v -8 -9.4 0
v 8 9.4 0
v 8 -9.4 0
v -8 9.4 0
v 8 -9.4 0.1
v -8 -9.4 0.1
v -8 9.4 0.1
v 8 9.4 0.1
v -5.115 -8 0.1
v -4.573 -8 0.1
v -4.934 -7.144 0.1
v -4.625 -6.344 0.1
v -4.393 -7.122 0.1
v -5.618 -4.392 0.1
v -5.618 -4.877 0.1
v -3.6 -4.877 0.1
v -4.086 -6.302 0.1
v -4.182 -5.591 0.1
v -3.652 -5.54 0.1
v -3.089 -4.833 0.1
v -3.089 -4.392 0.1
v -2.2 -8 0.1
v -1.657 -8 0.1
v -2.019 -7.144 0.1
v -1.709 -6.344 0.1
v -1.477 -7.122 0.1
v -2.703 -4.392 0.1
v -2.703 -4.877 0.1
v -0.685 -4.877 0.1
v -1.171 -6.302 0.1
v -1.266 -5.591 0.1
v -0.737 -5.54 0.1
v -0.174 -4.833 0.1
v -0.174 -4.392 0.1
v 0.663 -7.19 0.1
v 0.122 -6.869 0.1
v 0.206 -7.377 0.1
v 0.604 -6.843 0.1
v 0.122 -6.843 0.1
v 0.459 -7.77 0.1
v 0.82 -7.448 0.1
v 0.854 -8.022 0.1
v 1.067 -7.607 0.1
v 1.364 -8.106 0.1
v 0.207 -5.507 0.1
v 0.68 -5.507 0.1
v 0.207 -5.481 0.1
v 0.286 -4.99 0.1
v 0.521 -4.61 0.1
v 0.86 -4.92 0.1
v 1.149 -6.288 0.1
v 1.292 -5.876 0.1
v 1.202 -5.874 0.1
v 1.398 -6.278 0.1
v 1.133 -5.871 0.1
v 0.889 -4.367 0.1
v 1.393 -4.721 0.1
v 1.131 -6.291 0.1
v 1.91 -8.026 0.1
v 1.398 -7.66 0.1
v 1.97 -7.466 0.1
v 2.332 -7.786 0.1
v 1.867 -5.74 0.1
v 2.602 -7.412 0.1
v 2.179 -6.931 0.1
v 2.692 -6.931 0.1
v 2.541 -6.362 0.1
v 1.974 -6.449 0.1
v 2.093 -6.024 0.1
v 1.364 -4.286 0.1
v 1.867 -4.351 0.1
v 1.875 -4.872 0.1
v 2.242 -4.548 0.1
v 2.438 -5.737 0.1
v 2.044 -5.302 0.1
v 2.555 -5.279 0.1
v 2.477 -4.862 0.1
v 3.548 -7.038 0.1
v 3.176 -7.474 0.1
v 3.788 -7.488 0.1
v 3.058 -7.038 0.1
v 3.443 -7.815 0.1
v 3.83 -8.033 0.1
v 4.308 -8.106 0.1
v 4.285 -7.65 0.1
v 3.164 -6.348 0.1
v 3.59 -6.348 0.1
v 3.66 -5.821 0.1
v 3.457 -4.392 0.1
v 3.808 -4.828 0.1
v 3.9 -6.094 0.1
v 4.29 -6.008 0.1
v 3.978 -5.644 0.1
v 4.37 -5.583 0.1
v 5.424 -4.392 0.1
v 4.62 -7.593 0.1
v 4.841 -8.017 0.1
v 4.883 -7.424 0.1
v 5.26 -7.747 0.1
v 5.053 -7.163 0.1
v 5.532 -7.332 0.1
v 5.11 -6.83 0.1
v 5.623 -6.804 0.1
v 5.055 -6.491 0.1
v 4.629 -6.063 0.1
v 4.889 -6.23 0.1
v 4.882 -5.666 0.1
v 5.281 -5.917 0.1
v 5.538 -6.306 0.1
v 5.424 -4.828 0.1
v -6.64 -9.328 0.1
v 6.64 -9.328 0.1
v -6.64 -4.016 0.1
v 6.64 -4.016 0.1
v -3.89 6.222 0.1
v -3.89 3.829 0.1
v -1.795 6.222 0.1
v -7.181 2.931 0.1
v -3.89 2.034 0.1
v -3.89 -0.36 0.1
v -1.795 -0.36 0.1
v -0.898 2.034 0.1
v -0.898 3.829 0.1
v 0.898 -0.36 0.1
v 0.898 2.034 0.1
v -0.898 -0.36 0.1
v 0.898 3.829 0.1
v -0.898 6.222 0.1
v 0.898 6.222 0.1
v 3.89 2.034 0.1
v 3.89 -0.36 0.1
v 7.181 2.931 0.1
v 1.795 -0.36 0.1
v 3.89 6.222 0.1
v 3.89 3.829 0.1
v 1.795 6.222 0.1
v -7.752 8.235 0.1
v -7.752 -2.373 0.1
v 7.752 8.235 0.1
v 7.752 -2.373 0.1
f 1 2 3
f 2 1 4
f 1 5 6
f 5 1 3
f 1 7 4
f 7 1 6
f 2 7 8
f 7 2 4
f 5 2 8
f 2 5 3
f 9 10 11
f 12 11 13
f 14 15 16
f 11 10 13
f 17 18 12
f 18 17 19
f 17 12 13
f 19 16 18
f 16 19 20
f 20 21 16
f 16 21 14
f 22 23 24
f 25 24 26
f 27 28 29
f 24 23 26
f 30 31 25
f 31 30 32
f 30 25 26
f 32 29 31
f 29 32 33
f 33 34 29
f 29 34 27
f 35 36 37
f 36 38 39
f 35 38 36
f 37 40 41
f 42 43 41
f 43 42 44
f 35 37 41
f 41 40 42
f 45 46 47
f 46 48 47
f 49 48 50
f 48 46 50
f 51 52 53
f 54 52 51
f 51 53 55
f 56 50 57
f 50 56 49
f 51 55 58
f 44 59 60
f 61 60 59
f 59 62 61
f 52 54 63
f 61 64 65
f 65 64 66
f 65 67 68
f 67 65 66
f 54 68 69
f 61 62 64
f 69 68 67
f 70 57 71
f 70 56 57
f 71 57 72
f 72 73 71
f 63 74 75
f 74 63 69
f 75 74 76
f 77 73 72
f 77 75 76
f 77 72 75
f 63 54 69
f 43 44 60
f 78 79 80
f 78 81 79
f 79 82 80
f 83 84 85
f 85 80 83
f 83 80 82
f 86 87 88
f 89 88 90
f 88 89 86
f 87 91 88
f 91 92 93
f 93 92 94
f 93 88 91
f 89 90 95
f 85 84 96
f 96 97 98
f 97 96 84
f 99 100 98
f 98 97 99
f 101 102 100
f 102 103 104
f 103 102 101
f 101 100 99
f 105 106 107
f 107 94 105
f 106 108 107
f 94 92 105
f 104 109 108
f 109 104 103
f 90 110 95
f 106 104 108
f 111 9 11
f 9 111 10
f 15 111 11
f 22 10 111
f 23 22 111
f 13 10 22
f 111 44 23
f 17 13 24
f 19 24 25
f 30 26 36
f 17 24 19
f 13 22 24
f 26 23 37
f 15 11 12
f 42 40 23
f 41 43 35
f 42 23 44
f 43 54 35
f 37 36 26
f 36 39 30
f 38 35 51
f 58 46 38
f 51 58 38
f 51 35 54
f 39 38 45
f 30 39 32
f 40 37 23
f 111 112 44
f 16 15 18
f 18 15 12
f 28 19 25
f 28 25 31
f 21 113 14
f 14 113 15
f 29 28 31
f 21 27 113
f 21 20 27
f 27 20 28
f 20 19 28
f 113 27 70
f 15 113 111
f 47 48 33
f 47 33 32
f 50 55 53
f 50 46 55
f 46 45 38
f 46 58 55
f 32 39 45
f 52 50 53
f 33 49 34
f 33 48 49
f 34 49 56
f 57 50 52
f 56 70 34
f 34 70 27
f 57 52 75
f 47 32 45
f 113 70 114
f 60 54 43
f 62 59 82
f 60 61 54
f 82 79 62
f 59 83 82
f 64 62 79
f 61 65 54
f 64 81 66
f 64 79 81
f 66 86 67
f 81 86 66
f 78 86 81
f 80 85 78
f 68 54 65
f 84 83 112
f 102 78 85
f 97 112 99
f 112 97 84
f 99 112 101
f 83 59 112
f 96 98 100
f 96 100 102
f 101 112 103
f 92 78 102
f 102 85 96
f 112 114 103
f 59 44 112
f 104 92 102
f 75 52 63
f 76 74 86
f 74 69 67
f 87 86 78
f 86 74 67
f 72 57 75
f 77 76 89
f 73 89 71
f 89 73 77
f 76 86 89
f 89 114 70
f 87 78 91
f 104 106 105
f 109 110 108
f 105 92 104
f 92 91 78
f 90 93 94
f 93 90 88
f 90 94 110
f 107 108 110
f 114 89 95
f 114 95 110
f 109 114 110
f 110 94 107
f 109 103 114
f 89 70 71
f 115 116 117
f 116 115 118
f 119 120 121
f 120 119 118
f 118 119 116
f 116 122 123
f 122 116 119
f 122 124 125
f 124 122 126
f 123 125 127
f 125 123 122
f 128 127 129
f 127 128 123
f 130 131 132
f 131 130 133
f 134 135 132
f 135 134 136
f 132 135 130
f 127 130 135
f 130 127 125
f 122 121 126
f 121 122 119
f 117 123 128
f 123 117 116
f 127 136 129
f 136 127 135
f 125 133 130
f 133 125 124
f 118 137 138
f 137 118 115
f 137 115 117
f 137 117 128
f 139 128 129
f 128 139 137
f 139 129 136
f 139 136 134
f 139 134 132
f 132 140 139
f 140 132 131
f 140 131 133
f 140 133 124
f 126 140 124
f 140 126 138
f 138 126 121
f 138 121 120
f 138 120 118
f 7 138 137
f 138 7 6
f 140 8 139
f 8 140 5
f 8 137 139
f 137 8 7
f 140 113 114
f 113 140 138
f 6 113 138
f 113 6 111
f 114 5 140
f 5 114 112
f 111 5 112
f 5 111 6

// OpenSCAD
// file: s/191915schb.scad
use <../../lib.scad>
function ldraw_lib__s__191915schb() = [
// 0 ~Swiss Railways Logo Background
// 0 Name: s\191915schb.dat
// 0 Author: Chris Dee [cwdee]
// 0 !LDRAW_ORG Subpart UPDATE 2012-01
// 0 !LICENSE Licensed under CC BY 2.0 and CC BY 4.0 : see CAreadme.txt
// 
// 0 BFC CERTIFY CCW
  [0,"BFC","CERTIFY"],
  [0,"BFC","CCW"],
// 
// 0 !HISTORY 2012-03-30 [PTadmin] Official Update 2012-01
// 
// 
// 4 16 -13.2 0 -24.2 -6.6 0 -24.2 -6.6 0 -6.6 -28.6 0 -6.6
  [4,16,-13.2,0,-24.2,-6.6,0,-24.2,-6.6,0,-6.6,-28.6,0,-6.6],
// 4 16 -6.6 0 6.6 -6.6 0 24.2 -13.2 0 24.2 -28.6 0 6.6
  [4,16,-6.6,0,6.6,-6.6,0,24.2,-13.2,0,24.2,-28.6,0,6.6],
// 4 16 13.2 0 24.2 6.6 0 24.2 6.6 0 6.6 28.6 0 6.6
  [4,16,13.2,0,24.2,6.6,0,24.2,6.6,0,6.6,28.6,0,6.6],
// 4 16 6.6 0 -6.6 6.6 0 -24.2 13.2 0 -24.2 28.6 0 -6.6
  [4,16,6.6,0,-6.6,6.6,0,-24.2,13.2,0,-24.2,28.6,0,-6.6],
// 
// 3 16 -52.8 0 0 -57 0 39 -57 0 -39
  [3,16,-52.8,0,0,-57,0,39,-57,0,-39],
// 3 16 -57 0 39 -52.8 0 0 -28.6 0 24.2
  [3,16,-57,0,39,-52.8,0,0,-28.6,0,24.2],
// 3 16 -57 0 39 -28.6 0 24.2 -13.2 0 24.2
  [3,16,-57,0,39,-28.6,0,24.2,-13.2,0,24.2],
// 3 16 -57 0 39 -13.2 0 24.2 -6.6 0 24.2
  [3,16,-57,0,39,-13.2,0,24.2,-6.6,0,24.2],
// 4 16 -57 0 39 -6.6 0 24.2 6.6 0 24.2 57 0 39
  [4,16,-57,0,39,-6.6,0,24.2,6.6,0,24.2,57,0,39],
// 3 16 57 0 39 6.6 0 24.2 13.2 0 24.2
  [3,16,57,0,39,6.6,0,24.2,13.2,0,24.2],
// 3 16 57 0 39 13.2 0 24.2 28.6 0 24.2
  [3,16,57,0,39,13.2,0,24.2,28.6,0,24.2],
// 3 16 57 0 39 28.6 0 24.2 52.8 0 0
  [3,16,57,0,39,28.6,0,24.2,52.8,0,0],
// 
// 3 16 52.8 0 0 57 0 -39 57 0 39
  [3,16,52.8,0,0,57,0,-39,57,0,39],
// 3 16 57 0 -39 52.8 0 0 28.6 0 -24.2
  [3,16,57,0,-39,52.8,0,0,28.6,0,-24.2],
// 3 16 57 0 -39 28.6 0 -24.2 13.2 0 -24.2
  [3,16,57,0,-39,28.6,0,-24.2,13.2,0,-24.2],
// 3 16 57 0 -39 13.2 0 -24.2 6.6 0 -24.2
  [3,16,57,0,-39,13.2,0,-24.2,6.6,0,-24.2],
// 4 16 57 0 -39 6.6 0 -24.2 -6.6 0 -24.2 -57 0 -39
  [4,16,57,0,-39,6.6,0,-24.2,-6.6,0,-24.2,-57,0,-39],
// 3 16 -57 0 -39 -6.6 0 -24.2 -13.2 0 -24.2
  [3,16,-57,0,-39,-6.6,0,-24.2,-13.2,0,-24.2],
// 3 16 -57 0 -39 -13.2 0 -24.2 -28.6 0 -24.2
  [3,16,-57,0,-39,-13.2,0,-24.2,-28.6,0,-24.2],
// 3 16 -57 0 -39 -28.6 0 -24.2 -52.8 0 0
  [3,16,-57,0,-39,-28.6,0,-24.2,-52.8,0,0],
// 0
];
module ldraw_lib__s__191915schb(step=0, col=false, unit=2/5, alt=false, line=0.2, solid=!$preview)
    makepoly(ldraw_lib__s__191915schb(), step=step, col=col, unit=unit, alt=alt, line=line, solid=solid);
ldraw_lib__s__191915schb(line=0.2);
// file: s/191915scha.scad
use <../../lib.scad>
function ldraw_lib__s__191915scha() = [
// 0 ~Swiss Railways Logo Foreground
// 0 Name: s\191915scha.dat
// 0 Author: Chris Dee [cwdee]
// 0 !LDRAW_ORG Subpart UPDATE 2012-01
// 0 !LICENSE Licensed under CC BY 2.0 and CC BY 4.0 : see CAreadme.txt
// 
// 0 BFC CERTIFY CCW
  [0,"BFC","CERTIFY"],
  [0,"BFC","CCW"],
// 
// 0 !HISTORY 2012-03-30 [PTadmin] Official Update 2012-01
// 
// 
// 4 16 -13.2 0 24.2 -28.6 0 24.2 -52.8 0 0 -28.6 0 6.6
  [4,16,-13.2,0,24.2,-28.6,0,24.2,-52.8,0,0,-28.6,0,6.6],
// 4 16 -52.8 0 0 -28.6 0 -24.2 -13.2 0 -24.2 -28.6 0 -6.6
  [4,16,-52.8,0,0,-28.6,0,-24.2,-13.2,0,-24.2,-28.6,0,-6.6],
// 3 16 -52.8 0 0 -28.6 0 -6.6 -28.6 0 6.6
  [3,16,-52.8,0,0,-28.6,0,-6.6,-28.6,0,6.6],
// 4 16 -28.6 0 6.6 -28.6 0 -6.6 -6.6 0 -6.6 -6.6 0 6.6
  [4,16,-28.6,0,6.6,-28.6,0,-6.6,-6.6,0,-6.6,-6.6,0,6.6],
// 
// 4 16 6.6 0 -6.6 -6.6 0 -6.6 -6.6 0 -24.2 6.6 0 -24.2
  [4,16,6.6,0,-6.6,-6.6,0,-6.6,-6.6,0,-24.2,6.6,0,-24.2],
// 4 16 6.6 0 6.6 -6.6 0 6.6 -6.6 0 -6.6 6.6 0 -6.6
  [4,16,6.6,0,6.6,-6.6,0,6.6,-6.6,0,-6.6,6.6,0,-6.6],
// 4 16 6.6 0 24.2 -6.6 0 24.2 -6.6 0 6.6 6.6 0 6.6
  [4,16,6.6,0,24.2,-6.6,0,24.2,-6.6,0,6.6,6.6,0,6.6],
// 
// 4 16 13.2 0 -24.2 28.6 0 -24.2 52.8 0 0 28.6 0 -6.6
  [4,16,13.2,0,-24.2,28.6,0,-24.2,52.8,0,0,28.6,0,-6.6],
// 4 16 52.8 0 0 28.6 0 24.2 13.2 0 24.2 28.6 0 6.6
  [4,16,52.8,0,0,28.6,0,24.2,13.2,0,24.2,28.6,0,6.6],
// 3 16 52.8 0 0 28.6 0 6.6 28.6 0 -6.6
  [3,16,52.8,0,0,28.6,0,6.6,28.6,0,-6.6],
// 4 16 28.6 0 -6.6 28.6 0 6.6 6.6 0 6.6 6.6 0 -6.6
  [4,16,28.6,0,-6.6,28.6,0,6.6,6.6,0,6.6,6.6,0,-6.6],
// 0
];
module ldraw_lib__s__191915scha(step=0, col=false, unit=2/5, alt=false, line=0.2, solid=!$preview)
    makepoly(ldraw_lib__s__191915scha(), step=step, col=col, unit=unit, alt=alt, line=line, solid=solid);
ldraw_lib__s__191915scha(line=0.2);
// file: s/196945sch.scad
use <../../lib.scad>
use <191915scha.scad>
use <191915schb.scad>
function ldraw_lib__s__196945sch() = [
// 0 ~Swiss Railways Logo Black
// 0 Name: s\196945sch.dat
// 0 Author: Chris Dee [cwdee]
// 0 !LDRAW_ORG Subpart UPDATE 2012-01
// 0 !LICENSE Licensed under CC BY 2.0 and CC BY 4.0 : see CAreadme.txt
// 
// 0 BFC CERTIFY CCW
  [0,"BFC","CERTIFY"],
  [0,"BFC","CCW"],
// 
// 0 !HISTORY 2012-03-30 [PTadmin] Official Update 2012-01
// 
// 
// 1 0 0 0 0 1 0 0 0 1 0 0 0 1 s\191915scha.dat
  [1,0,0,0,0,1,0,0,0,1,0,0,0,1, ldraw_lib__s__191915scha()],
// 1 16 0 0 0 1 0 0 0 1 0 0 0 1 s\191915schb.dat
  [1,16,0,0,0,1,0,0,0,1,0,0,0,1, ldraw_lib__s__191915schb()],
// 0
];
module ldraw_lib__s__196945sch(step=0, col=false, unit=2/5, alt=false, line=0.2, solid=!$preview)
    makepoly(ldraw_lib__s__196945sch(), step=step, col=col, unit=unit, alt=alt, line=line, solid=solid);
ldraw_lib__s__196945sch(line=0.2);
// file: ../p/box5-12.scad
use <../lib.scad>
function ldraw_lib__box5_12() = [
// 0 Box with 5 Faces without Any Edges
// 0 Name: box5-12.dat
// 0 Author: Chris Dee [cwdee]
// 0 !LDRAW_ORG Primitive UPDATE 2009-02
// 0 !LICENSE Licensed under CC BY 2.0 and CC BY 4.0 : see CAreadme.txt
// 
// 0 BFC CERTIFY CCW
  [0,"BFC","CERTIFY"],
  [0,"BFC","CCW"],
// 
// 0 !HISTORY 2009-09-03 [PTadmin] Official Update 2009-02
// 
// 
// 4 16 1 1 1 1 1 -1 -1 1 -1 -1 1 1
  [4,16,1,1,1,1,1,-1,-1,1,-1,-1,1,1],
// 4 16 -1 0 1 1 0 1 1 1 1 -1 1 1
  [4,16,-1,0,1,1,0,1,1,1,1,-1,1,1],
// 4 16 -1 0 -1 -1 0 1 -1 1 1 -1 1 -1
  [4,16,-1,0,-1,-1,0,1,-1,1,1,-1,1,-1],
// 4 16 1 0 -1 -1 0 -1 -1 1 -1 1 1 -1
  [4,16,1,0,-1,-1,0,-1,-1,1,-1,1,1,-1],
// 4 16 1 0 1 1 0 -1 1 1 -1 1 1 1
  [4,16,1,0,1,1,0,-1,1,1,-1,1,1,1],
// 0
];
module ldraw_lib__box5_12(step=0, col=false, unit=2/5, alt=false, line=0.2, solid=!$preview)
    makepoly(ldraw_lib__box5_12(), step=step, col=col, unit=unit, alt=alt, line=line, solid=solid);
ldraw_lib__box5_12(line=0.2);
// main file
use <../lib.scad>
use <../p/box5-12.scad>
use <s/196945s02.scad>
use <s/196945sch.scad>
function ldraw_lib__196945p() = [
// 0 Sticker  2.4 x  2 with Black Swiss Railways Logo and "7735"
// 0 Name: 196945p.dat
// 0 Author: Chris Dee [cwdee]
// 0 !LDRAW_ORG Part UPDATE 2012-01
// 0 !LICENSE Licensed under CC BY 2.0 and CC BY 4.0 : see CAreadme.txt
// 
// 0 BFC CERTIFY CCW
  [0,"BFC","CERTIFY"],
  [0,"BFC","CCW"],
// 
// 0 !HISTORY 2012-03-30 [PTadmin] Official Update 2012-01
// 
// 
// 1 16 0 -0.25 0 20 0 0 0 0.25 0 0 0 -23.5 box5-12.dat
  [1,16,0,-0.25,0,20,0,0,0,0.25,0,0,0,-23.5, ldraw_lib__box5_12()],
// 1 16 0 -0.25 -20 0.415 0 0 0 1 0 0 0 0.415 s\196945s02.dat
  [1,16,0,-0.25,-20,0.415,0,0,0,1,0,0,0,0.415, ldraw_lib__s__196945s02()],
// 1 16 0 -0.25 7.328 0.34 0 0 0 1 0 0 0 0.34 s\196945sch.dat
  [1,16,0,-0.25,7.328,0.34,0,0,0,1,0,0,0,0.34, ldraw_lib__s__196945sch()],
// 4 16 -20 -0.25 -23.5 -19.38 -0.25 -5.932 -19.38 -0.25 20.588 -20 -0.25 23.5
  [4,16,-20,-0.25,-23.5,-19.38,-0.25,-5.932,-19.38,-0.25,20.588,-20,-0.25,23.5],
// 4 16 20 -0.25 23.5 19.38 -0.25 20.588 19.38 -0.25 -5.932 20 -0.25 -23.5
  [4,16,20,-0.25,23.5,19.38,-0.25,20.588,19.38,-0.25,-5.932,20,-0.25,-23.5],
// 4 16 -20 -0.25 23.5 -19.38 -0.25 20.588 19.38 -0.25 20.588 20 -0.25 23.5
  [4,16,-20,-0.25,23.5,-19.38,-0.25,20.588,19.38,-0.25,20.588,20,-0.25,23.5],
// 4 16 -19.38 -0.25 -5.932 -16.6 -0.25 -10.04 16.6 -0.25 -10.04 19.38 -0.25 -5.932
  [4,16,-19.38,-0.25,-5.932,-16.6,-0.25,-10.04,16.6,-0.25,-10.04,19.38,-0.25,-5.932],
// 4 16 -16.6 -0.25 -10.04 -19.38 -0.25 -5.932 -20 -0.25 -23.5 -16.6 -0.25 -23.32
  [4,16,-16.6,-0.25,-10.04,-19.38,-0.25,-5.932,-20,-0.25,-23.5,-16.6,-0.25,-23.32],
// 4 16 16.6 -0.25 -23.32 20 -0.25 -23.5 19.38 -0.25 -5.932 16.6 -0.25 -10.04
  [4,16,16.6,-0.25,-23.32,20,-0.25,-23.5,19.38,-0.25,-5.932,16.6,-0.25,-10.04],
// 4 16 -16.6 -0.25 -23.32 -20 -0.25 -23.5 20 -0.25 -23.5 16.6 -0.25 -23.32
  [4,16,-16.6,-0.25,-23.32,-20,-0.25,-23.5,20,-0.25,-23.5,16.6,-0.25,-23.32],
];
module ldraw_lib__196945p(step=0, col=false, unit=2/5, alt=false, line=0.2, solid=!$preview)
    makepoly(ldraw_lib__196945p(), step=step, col=col, unit=unit, alt=alt, line=line, solid=solid);
ldraw_lib__196945p(line=0.2);
